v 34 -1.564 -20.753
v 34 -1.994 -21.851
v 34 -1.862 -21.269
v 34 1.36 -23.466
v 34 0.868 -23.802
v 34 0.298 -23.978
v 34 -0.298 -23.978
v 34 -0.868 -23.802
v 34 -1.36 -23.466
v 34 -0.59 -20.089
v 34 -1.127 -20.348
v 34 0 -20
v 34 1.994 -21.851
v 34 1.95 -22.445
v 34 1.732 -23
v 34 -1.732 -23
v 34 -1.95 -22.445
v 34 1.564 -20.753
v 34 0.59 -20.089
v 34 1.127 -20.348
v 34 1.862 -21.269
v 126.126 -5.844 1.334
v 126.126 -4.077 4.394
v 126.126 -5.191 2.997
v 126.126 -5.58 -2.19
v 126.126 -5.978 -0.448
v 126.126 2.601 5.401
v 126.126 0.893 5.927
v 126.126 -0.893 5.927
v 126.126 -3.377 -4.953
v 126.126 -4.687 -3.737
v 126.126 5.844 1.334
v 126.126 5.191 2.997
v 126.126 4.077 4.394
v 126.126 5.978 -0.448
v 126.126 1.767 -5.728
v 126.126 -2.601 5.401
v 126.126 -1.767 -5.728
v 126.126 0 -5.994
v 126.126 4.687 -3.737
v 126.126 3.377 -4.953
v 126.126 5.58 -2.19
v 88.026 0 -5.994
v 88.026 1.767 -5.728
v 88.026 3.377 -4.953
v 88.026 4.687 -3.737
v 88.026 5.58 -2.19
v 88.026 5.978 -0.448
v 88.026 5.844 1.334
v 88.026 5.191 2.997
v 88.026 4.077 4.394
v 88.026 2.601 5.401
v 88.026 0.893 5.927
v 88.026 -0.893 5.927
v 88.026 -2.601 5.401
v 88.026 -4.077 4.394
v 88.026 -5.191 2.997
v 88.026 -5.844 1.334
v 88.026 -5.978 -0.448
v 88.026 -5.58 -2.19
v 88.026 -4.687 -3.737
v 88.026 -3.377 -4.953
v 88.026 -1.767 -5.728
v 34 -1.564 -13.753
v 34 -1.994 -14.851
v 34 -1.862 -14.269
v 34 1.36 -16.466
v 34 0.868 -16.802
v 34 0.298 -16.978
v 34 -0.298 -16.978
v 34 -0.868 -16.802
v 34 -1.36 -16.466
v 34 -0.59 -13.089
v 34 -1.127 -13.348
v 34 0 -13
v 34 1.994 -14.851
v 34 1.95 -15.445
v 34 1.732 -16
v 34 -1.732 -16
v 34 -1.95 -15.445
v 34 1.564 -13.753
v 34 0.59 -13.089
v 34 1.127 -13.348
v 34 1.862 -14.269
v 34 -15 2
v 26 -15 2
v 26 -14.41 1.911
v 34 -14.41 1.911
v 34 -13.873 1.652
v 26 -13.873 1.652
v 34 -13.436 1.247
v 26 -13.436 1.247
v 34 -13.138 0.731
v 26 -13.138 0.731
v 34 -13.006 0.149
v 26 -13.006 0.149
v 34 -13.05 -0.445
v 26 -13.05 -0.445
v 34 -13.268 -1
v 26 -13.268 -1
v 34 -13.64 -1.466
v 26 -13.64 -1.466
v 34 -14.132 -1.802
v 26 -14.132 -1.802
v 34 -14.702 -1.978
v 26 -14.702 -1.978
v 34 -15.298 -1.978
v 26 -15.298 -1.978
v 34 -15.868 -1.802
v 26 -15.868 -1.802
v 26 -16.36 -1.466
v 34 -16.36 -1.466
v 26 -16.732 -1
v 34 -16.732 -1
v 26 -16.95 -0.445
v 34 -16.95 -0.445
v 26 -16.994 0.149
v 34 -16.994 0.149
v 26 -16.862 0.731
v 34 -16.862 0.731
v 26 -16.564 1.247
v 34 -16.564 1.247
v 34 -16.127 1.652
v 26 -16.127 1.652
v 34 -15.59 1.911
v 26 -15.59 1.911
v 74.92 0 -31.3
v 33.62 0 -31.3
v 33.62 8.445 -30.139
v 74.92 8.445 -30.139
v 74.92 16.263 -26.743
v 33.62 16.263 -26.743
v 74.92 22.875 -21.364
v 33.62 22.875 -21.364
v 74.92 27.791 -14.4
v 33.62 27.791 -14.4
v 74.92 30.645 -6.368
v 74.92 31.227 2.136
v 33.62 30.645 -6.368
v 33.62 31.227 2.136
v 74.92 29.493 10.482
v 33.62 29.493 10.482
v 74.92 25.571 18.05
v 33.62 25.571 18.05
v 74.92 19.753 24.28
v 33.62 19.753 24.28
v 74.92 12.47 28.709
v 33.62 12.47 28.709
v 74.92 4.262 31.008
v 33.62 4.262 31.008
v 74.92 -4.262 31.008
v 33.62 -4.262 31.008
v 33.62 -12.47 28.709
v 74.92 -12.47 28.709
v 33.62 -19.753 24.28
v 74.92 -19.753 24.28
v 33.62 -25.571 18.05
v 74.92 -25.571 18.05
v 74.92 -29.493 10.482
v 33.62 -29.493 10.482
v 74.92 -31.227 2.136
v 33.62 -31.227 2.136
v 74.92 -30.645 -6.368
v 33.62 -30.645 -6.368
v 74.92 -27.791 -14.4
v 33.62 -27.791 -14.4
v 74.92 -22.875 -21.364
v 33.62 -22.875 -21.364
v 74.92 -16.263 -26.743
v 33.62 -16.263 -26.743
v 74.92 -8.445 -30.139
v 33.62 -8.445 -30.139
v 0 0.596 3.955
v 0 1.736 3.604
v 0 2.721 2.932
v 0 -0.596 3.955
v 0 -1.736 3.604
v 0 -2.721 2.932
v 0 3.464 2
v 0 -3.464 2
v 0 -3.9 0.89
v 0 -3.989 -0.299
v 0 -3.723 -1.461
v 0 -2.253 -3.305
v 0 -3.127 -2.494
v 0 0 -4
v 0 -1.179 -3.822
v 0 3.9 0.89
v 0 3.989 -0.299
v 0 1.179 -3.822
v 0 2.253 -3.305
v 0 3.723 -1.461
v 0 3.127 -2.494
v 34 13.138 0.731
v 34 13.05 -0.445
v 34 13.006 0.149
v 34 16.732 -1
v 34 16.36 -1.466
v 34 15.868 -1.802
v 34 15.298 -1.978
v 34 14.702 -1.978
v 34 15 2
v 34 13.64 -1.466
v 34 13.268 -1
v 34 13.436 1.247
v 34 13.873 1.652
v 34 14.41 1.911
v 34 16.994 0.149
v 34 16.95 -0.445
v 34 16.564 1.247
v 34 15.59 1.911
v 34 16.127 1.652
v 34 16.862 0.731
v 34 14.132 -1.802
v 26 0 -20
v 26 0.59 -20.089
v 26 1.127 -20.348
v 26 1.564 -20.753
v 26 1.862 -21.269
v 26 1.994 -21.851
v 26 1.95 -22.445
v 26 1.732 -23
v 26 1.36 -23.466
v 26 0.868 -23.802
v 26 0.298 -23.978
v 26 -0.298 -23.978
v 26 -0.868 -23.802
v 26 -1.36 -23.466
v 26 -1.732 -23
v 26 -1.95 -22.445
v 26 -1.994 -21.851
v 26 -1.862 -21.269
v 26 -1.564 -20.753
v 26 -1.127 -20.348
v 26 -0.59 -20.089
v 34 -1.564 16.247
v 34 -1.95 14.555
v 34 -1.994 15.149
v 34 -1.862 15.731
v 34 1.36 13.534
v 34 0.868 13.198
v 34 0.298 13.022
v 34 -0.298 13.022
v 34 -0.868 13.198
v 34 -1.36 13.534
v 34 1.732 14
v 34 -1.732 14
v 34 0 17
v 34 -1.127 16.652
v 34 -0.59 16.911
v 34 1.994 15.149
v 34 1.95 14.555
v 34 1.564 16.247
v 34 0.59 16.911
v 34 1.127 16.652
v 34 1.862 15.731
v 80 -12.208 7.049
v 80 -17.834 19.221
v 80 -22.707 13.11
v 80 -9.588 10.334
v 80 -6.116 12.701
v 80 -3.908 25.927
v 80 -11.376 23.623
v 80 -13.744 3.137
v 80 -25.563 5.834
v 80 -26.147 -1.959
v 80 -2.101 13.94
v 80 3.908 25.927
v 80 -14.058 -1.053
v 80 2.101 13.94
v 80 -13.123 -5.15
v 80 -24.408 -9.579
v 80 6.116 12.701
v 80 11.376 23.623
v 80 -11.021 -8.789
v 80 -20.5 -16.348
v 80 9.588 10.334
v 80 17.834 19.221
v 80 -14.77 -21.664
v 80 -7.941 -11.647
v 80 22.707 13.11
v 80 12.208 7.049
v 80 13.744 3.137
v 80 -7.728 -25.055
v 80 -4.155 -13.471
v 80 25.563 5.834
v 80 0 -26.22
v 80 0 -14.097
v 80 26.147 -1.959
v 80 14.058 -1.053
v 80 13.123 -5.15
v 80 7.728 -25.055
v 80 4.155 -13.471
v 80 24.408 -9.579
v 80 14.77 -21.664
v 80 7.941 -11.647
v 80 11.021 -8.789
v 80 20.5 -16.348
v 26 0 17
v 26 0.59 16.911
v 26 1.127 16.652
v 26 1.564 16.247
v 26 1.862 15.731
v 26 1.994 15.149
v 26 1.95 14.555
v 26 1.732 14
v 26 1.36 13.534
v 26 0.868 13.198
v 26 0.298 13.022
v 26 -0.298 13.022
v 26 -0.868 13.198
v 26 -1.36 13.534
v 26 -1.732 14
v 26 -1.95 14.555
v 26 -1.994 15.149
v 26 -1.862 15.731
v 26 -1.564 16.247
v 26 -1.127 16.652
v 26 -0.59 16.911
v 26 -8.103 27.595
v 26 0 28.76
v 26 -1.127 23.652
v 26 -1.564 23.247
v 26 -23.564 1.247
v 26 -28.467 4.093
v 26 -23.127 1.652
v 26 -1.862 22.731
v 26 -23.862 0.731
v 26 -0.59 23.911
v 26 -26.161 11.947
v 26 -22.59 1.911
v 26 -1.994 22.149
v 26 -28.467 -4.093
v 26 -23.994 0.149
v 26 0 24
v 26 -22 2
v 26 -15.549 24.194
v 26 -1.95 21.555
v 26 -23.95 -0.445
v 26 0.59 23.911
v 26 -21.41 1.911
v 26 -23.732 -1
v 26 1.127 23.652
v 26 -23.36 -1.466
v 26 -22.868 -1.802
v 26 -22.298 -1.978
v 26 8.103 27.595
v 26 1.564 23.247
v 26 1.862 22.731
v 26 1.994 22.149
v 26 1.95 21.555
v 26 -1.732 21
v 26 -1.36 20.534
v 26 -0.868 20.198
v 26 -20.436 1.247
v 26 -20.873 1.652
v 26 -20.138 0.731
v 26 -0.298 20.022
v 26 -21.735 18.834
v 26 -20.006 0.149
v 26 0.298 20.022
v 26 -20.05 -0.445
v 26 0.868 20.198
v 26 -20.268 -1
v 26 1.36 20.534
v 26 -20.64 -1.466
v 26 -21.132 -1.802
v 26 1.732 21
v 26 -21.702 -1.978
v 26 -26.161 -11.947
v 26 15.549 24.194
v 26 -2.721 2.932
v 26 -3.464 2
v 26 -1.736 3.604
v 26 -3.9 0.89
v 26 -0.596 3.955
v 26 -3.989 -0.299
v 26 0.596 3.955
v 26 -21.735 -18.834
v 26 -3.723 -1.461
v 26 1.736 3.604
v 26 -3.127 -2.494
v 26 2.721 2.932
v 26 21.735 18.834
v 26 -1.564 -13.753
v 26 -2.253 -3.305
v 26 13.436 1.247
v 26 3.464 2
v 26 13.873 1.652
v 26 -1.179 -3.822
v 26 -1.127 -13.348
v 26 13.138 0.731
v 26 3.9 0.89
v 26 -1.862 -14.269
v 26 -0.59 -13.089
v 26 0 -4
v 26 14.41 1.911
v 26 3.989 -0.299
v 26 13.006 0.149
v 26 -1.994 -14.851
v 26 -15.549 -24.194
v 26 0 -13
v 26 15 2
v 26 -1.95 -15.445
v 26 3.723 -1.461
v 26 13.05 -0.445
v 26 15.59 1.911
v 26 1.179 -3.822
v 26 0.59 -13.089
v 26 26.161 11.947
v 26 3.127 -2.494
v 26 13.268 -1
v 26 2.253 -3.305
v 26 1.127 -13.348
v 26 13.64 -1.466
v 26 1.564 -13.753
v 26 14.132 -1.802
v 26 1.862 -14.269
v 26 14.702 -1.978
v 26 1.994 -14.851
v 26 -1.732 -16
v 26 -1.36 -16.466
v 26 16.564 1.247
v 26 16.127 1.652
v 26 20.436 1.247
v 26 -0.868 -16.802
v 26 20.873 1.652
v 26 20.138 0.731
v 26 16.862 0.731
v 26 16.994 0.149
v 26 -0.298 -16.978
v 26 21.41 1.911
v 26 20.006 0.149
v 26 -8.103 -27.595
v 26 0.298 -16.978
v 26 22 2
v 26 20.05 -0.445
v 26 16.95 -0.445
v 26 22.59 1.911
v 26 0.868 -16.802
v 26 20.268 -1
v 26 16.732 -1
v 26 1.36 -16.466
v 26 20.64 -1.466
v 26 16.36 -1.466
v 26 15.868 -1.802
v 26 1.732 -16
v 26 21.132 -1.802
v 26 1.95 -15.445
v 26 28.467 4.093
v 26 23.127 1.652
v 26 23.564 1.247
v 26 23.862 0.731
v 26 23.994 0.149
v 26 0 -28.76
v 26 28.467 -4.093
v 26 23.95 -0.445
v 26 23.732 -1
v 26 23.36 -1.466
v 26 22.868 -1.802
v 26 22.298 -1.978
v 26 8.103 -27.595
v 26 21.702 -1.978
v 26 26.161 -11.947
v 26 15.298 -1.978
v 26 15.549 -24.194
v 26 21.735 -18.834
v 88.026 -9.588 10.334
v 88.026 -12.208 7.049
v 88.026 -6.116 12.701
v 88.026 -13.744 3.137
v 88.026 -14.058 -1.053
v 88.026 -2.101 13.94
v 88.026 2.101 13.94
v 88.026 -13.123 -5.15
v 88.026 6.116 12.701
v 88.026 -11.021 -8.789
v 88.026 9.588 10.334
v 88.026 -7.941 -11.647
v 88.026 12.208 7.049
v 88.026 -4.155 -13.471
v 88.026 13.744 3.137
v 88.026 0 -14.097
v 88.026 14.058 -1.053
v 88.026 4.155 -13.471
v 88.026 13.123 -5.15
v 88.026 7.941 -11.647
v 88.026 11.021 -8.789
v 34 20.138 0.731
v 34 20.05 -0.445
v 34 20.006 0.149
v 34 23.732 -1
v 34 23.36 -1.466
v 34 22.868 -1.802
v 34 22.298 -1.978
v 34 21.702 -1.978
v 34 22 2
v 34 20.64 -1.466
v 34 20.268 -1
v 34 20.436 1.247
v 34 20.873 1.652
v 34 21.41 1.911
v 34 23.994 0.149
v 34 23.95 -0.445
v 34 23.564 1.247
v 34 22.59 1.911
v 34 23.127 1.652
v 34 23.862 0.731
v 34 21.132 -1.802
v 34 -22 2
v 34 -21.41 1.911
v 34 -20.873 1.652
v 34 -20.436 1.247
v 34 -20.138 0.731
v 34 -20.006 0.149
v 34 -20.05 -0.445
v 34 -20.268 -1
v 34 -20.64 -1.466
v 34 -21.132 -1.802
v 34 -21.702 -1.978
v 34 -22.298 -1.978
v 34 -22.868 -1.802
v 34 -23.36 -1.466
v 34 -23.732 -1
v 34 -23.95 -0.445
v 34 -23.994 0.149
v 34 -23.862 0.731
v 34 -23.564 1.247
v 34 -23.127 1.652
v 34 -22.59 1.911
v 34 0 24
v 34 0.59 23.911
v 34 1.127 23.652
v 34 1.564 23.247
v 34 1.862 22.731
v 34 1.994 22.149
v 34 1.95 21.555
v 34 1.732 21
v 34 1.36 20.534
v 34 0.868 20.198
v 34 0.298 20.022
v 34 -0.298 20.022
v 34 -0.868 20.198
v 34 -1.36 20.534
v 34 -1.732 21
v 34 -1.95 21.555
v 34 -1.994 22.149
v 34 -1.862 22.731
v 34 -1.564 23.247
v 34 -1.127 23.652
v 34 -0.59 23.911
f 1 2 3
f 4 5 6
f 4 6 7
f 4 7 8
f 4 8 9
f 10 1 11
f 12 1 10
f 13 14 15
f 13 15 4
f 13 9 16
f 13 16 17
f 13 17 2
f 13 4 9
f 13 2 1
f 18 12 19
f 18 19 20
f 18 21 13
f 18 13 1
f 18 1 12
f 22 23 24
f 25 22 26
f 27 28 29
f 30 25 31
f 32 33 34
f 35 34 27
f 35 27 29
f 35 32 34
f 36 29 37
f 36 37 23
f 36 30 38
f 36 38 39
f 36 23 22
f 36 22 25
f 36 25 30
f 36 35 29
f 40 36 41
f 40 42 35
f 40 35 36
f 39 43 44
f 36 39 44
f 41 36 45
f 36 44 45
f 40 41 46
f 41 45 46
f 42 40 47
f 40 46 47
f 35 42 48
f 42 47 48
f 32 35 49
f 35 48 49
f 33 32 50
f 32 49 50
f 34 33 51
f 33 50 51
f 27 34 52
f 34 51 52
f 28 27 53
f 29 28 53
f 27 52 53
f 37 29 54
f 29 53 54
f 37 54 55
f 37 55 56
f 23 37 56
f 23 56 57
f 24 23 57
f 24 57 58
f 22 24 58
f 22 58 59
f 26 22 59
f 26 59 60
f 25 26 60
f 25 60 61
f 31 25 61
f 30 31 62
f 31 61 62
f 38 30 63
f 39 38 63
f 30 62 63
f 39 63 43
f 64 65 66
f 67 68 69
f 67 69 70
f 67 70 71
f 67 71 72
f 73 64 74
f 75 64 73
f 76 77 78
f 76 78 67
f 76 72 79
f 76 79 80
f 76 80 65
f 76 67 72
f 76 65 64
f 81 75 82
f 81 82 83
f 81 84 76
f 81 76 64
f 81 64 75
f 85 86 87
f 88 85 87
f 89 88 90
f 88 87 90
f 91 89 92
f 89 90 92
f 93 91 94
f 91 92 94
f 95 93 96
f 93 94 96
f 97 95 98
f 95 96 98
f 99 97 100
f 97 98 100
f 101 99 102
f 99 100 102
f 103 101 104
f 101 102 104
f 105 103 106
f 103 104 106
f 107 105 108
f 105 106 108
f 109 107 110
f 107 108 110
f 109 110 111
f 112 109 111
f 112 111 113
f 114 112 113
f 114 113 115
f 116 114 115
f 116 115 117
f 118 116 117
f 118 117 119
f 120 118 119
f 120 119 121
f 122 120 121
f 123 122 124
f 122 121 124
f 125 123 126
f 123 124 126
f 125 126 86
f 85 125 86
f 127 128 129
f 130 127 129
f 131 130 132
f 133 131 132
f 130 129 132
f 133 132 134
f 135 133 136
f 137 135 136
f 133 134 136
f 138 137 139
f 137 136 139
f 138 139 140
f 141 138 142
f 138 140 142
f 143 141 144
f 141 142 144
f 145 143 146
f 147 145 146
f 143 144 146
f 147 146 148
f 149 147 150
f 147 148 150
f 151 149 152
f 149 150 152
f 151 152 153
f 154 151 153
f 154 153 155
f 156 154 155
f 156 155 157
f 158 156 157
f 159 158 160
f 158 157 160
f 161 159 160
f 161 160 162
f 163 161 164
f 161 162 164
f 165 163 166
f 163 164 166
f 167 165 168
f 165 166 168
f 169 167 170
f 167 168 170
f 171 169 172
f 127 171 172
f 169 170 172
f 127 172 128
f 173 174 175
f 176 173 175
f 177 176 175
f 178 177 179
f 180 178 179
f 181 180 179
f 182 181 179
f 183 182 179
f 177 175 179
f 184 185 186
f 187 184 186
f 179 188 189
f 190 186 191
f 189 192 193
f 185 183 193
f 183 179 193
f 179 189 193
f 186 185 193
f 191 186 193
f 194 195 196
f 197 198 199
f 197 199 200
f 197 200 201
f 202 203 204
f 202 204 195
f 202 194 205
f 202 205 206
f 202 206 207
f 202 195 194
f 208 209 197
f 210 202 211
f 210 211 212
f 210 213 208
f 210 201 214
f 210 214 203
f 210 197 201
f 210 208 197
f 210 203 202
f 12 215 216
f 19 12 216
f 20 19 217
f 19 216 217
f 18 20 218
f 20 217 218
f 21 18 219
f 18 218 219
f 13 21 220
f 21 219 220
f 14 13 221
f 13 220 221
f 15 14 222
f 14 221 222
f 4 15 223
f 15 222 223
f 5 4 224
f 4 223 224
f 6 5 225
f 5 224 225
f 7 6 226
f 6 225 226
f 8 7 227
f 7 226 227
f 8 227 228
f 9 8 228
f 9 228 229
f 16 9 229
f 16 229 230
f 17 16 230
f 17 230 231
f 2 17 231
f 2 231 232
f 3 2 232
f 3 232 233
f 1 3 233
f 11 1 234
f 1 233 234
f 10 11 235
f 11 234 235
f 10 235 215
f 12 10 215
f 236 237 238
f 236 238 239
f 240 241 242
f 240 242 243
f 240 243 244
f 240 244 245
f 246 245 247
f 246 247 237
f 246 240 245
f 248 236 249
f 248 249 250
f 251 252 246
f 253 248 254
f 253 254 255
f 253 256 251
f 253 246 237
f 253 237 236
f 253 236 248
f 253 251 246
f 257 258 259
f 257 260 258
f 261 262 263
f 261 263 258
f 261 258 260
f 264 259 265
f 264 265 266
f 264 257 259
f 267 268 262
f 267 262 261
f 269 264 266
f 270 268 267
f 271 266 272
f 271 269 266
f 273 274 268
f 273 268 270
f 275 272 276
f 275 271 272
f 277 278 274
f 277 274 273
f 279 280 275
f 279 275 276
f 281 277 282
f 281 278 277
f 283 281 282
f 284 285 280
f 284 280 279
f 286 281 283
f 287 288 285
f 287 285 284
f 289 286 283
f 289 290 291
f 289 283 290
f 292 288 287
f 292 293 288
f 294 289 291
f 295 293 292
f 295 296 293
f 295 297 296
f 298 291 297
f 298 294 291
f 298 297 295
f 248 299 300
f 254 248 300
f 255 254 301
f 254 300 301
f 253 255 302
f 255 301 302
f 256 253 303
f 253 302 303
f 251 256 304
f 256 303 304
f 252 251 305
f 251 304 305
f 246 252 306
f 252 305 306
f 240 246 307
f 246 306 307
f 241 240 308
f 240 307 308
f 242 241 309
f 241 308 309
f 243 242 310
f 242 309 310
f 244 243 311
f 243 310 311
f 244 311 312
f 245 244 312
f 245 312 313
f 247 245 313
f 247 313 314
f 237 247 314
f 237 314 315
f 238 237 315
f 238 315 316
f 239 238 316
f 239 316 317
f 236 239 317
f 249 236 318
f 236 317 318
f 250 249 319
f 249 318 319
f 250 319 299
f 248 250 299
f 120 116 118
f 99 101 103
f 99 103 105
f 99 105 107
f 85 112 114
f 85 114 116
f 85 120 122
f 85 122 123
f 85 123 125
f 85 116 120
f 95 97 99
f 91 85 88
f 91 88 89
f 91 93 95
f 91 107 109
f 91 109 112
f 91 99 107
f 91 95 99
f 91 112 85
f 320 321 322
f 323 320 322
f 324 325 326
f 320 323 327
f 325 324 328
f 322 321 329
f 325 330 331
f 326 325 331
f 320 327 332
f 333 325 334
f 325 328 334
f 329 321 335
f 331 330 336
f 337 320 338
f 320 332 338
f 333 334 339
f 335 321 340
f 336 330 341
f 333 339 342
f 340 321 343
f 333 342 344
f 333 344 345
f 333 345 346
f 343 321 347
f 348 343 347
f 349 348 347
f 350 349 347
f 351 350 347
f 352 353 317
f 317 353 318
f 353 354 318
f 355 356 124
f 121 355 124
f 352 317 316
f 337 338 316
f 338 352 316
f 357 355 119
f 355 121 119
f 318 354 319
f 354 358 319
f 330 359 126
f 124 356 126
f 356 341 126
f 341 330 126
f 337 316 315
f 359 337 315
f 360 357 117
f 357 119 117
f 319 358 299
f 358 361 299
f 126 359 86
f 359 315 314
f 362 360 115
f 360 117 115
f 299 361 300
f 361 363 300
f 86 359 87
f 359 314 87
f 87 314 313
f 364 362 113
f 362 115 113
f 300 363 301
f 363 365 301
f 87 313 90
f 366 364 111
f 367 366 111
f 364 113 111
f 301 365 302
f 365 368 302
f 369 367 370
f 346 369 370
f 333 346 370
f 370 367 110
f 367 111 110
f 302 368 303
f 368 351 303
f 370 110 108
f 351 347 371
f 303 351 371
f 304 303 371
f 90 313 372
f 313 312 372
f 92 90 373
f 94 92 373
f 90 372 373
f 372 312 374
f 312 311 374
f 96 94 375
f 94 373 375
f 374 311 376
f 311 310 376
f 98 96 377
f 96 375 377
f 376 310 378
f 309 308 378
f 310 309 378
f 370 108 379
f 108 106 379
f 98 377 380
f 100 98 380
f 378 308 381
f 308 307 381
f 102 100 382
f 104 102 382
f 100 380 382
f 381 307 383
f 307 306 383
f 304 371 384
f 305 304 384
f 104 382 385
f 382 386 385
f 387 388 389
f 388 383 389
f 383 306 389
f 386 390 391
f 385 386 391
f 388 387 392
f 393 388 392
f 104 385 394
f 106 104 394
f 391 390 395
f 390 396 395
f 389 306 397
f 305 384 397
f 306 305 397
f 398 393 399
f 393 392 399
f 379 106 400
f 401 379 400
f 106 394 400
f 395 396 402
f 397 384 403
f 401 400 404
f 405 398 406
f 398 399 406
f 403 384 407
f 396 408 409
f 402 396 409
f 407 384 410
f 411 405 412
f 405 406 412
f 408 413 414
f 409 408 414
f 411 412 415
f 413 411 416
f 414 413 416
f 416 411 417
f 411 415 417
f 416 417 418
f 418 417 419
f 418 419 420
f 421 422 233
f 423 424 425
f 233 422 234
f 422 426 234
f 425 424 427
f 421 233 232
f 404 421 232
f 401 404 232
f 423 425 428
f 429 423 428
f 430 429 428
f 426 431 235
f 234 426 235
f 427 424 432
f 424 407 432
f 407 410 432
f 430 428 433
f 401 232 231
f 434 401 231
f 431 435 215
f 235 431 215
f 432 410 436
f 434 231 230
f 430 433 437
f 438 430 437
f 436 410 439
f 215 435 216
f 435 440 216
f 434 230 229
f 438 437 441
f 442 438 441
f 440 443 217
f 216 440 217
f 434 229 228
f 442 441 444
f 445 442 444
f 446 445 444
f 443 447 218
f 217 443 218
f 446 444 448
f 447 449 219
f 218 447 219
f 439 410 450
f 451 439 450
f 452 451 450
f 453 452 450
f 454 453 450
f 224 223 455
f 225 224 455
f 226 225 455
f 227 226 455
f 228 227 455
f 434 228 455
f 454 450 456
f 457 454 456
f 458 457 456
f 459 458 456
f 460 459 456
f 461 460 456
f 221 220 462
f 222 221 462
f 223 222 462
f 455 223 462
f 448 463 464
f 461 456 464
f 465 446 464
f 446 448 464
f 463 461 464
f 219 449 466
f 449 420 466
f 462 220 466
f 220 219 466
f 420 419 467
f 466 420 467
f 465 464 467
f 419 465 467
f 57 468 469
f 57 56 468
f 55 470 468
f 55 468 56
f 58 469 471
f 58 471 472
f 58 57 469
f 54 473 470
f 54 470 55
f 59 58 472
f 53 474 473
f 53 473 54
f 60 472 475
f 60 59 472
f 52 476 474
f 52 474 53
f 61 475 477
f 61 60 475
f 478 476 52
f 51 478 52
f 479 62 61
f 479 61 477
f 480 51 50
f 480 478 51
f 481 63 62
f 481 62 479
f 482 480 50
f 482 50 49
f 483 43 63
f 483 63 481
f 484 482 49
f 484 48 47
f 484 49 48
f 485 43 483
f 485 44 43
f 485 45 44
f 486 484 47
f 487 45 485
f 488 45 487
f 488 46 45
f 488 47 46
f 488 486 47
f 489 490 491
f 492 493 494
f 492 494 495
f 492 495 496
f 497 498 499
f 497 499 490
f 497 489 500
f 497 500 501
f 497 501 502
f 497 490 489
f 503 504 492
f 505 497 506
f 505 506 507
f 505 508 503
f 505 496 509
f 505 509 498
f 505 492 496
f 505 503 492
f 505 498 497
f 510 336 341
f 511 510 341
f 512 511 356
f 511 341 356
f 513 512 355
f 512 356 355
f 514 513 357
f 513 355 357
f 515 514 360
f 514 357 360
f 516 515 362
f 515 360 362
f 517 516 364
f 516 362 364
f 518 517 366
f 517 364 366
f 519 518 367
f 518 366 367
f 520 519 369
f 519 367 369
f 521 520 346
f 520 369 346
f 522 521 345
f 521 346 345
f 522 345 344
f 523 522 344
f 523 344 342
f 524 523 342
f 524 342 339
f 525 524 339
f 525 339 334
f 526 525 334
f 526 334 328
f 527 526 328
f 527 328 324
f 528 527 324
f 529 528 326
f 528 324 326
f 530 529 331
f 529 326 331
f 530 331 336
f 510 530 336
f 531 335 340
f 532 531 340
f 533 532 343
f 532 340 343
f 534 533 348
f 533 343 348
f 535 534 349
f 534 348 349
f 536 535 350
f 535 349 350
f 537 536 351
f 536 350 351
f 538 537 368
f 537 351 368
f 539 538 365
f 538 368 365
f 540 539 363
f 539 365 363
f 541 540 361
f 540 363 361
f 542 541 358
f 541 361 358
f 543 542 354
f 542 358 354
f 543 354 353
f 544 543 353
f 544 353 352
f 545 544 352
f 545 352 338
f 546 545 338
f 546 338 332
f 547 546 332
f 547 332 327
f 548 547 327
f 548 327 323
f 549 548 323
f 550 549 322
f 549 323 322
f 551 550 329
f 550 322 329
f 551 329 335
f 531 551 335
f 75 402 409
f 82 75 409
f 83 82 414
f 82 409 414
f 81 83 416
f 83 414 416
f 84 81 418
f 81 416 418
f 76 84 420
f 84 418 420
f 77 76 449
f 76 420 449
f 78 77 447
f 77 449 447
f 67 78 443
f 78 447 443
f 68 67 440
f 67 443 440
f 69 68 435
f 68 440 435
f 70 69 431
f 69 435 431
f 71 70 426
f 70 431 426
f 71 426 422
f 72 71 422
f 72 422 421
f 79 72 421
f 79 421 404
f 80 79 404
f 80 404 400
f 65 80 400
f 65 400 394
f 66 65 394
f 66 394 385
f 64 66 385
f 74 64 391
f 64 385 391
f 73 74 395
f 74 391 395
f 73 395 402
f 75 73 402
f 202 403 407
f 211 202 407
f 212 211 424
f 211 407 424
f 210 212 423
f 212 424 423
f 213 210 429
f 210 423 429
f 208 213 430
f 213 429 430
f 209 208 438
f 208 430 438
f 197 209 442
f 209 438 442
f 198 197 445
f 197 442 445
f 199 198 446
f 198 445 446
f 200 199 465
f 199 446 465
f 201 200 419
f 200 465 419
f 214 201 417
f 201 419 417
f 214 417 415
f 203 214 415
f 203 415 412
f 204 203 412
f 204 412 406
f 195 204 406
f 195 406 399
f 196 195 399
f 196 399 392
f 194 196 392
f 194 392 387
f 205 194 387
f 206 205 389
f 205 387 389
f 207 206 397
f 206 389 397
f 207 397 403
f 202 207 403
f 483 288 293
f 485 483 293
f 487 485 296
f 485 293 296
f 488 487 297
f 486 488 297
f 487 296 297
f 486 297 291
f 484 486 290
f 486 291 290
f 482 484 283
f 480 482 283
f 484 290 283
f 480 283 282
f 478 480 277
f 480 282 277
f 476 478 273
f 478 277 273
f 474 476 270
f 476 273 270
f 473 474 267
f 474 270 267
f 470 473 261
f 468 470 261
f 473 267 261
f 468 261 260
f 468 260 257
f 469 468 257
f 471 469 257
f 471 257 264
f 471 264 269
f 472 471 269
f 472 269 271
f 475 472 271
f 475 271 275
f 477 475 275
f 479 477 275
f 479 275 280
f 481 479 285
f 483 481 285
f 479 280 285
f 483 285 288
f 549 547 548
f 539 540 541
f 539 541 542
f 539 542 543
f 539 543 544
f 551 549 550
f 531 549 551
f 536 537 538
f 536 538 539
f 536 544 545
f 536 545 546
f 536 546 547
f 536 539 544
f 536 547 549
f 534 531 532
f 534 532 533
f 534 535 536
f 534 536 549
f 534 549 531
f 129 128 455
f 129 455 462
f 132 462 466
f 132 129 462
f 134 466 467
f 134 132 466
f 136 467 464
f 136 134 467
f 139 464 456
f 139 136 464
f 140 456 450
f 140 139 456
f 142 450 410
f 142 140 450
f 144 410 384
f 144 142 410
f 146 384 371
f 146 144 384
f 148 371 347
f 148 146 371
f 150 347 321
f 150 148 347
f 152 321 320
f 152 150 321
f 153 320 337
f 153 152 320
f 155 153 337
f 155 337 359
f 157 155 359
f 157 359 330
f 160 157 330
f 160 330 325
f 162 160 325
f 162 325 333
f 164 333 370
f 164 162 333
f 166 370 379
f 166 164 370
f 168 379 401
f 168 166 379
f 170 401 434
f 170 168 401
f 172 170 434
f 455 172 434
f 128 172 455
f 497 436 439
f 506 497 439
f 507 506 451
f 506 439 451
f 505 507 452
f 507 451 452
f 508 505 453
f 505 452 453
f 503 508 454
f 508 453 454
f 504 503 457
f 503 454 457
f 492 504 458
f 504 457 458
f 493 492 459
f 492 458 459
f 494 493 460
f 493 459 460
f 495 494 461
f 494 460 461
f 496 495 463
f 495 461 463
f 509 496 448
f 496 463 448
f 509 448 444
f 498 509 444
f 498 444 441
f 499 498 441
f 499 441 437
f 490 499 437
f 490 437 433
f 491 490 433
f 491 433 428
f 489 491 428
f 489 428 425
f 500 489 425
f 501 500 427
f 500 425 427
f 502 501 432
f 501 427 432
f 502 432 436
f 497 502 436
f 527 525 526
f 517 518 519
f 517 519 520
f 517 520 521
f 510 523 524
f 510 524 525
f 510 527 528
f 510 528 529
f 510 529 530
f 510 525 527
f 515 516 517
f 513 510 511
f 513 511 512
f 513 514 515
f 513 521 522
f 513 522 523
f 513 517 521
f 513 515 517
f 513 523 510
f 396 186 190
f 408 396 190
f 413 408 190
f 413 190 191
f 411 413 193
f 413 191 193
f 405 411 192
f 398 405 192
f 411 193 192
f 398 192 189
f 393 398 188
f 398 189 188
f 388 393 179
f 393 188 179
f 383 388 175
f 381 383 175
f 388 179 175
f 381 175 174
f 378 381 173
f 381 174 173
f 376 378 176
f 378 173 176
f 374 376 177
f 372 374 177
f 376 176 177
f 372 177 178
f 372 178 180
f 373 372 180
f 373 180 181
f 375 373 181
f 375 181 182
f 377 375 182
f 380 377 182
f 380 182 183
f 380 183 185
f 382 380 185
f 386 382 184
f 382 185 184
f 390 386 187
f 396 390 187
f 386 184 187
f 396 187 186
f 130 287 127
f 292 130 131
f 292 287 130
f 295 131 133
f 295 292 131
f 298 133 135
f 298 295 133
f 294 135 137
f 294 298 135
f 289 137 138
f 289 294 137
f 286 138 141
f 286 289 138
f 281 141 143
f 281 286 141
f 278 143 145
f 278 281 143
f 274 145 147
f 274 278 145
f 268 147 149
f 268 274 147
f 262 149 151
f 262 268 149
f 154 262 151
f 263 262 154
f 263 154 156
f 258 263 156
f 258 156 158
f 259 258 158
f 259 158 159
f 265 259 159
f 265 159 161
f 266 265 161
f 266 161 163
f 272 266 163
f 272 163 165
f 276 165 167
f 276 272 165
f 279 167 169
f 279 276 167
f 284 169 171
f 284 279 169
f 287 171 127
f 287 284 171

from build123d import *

# Parameters (mm, degrees)
SKETCH2_R           = 4
BOSS_EXTRUDE1_DEPTH = 26
SKETCH3_R           = 31.3
BOSS_EXTRUDE2_DEPTH = 54
SKETCH4_R           = 2
CUT_EXTRUDE1_DEPTH  = 8
CHAMFER1_SIZE       = 2.54
CHAMFER1_SIZE2      = 7.62
CHAMFER2_SIZE       = 5.08
SKETCH5_R           = 14.097
BOSS_EXTRUDE3_DEPTH = 8.0264
SKETCH6_R           = 5.9944
BOSS_EXTRUDE4_DEPTH = 38.1


with BuildPart() as part:
    # Sketch2 → Boss-Extrude1 (new body)
    with BuildSketch(Plane(origin=(0, 0, 0), x_dir=(0, 0, -1), z_dir=(1, 0, 0))):
        Circle(SKETCH2_R)
    extrude(amount=BOSS_EXTRUDE1_DEPTH)

    # Sketch3 → Boss-Extrude2 (add)
    with BuildSketch(Plane(origin=(26, 0, 0), x_dir=(0, 0, -1), z_dir=(1, 0, 0))):
        Circle(SKETCH3_R)
    extrude(amount=BOSS_EXTRUDE2_DEPTH)

    # Sketch4 → Cut-Extrude1 (cut)
    with BuildSketch(Plane.ZY.offset(-26)):
        with Locations((15, 0)):
            Circle(SKETCH4_R)
        with Locations((0, -22)):
            Circle(SKETCH4_R)
        with Locations((0, -15)):
            Circle(SKETCH4_R)
        with Locations((-15, 0)):
            Circle(SKETCH4_R)
        with Locations((0, 15)):
            Circle(SKETCH4_R)
        with Locations((0, 22)):
            Circle(SKETCH4_R)
        with Locations((22, 0)):
            Circle(SKETCH4_R)
        with Locations((-22, 0)):
            Circle(SKETCH4_R)
    extrude(amount=-CUT_EXTRUDE1_DEPTH, mode=Mode.SUBTRACT)

    # Chamfer1
    chamfer1_edges = [part.edges().sort_by_distance(p)[0] for p in [
        (26, 0, 31.3),
    ]]
    chamfer1_side = [part.faces().sort_by_distance(p)[0] for p in [
        (26, 0, 30.41470231),
    ]]
    chamfer(chamfer1_edges, length=CHAMFER1_SIZE, length2=CHAMFER1_SIZE2, reference=chamfer1_side[0])

    # Chamfer2
    chamfer2_edges = [part.edges().sort_by_distance(p)[0] for p in [
        (80, 0, 31.3),
    ]]
    chamfer(chamfer2_edges, length=CHAMFER2_SIZE)

    # Sketch5 → Boss-Extrude3 (add)
    with BuildSketch(Plane(origin=(80, 0, 0), x_dir=(0, 0, -1), z_dir=(1, 0, 0))):
        Circle(SKETCH5_R)
    extrude(amount=BOSS_EXTRUDE3_DEPTH)

    # Sketch6 → Boss-Extrude4 (add)
    with BuildSketch(Plane(origin=(88.0264, 0, 0), x_dir=(0, 0, -1), z_dir=(1, 0, 0))):
        Circle(SKETCH6_R)
    extrude(amount=BOSS_EXTRUDE4_DEPTH)


solid = part.part
